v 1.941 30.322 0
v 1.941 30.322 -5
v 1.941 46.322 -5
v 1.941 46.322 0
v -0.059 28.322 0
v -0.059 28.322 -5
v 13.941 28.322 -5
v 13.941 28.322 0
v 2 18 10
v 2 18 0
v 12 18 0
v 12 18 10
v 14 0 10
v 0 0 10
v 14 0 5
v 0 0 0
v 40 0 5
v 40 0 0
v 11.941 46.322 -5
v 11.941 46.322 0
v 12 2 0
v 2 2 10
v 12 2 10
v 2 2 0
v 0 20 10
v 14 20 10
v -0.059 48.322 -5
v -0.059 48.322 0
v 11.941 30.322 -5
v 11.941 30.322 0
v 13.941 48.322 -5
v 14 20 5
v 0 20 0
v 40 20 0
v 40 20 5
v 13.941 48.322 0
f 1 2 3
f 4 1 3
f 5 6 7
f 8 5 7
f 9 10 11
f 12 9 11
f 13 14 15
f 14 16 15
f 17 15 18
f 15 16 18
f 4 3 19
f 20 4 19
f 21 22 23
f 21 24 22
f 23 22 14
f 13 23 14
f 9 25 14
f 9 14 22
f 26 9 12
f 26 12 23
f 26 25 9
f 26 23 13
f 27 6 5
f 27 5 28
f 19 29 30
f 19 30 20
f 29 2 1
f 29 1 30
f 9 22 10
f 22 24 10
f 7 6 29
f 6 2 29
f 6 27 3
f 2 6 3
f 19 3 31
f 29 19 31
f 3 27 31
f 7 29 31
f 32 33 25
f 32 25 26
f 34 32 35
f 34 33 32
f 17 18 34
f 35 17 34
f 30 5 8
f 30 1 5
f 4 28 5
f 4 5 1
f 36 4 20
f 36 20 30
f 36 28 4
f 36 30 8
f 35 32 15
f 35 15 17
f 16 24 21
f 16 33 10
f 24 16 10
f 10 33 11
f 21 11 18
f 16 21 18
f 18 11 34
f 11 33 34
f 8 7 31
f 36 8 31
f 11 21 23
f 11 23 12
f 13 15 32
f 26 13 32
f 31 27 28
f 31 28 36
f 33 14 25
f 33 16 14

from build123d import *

# Parameters (mm, degrees)
F2_W     = 14
F2_H     = 20
F2_W_2   = 10
F2_H_2   = 16
F3_DEPTH = 5
F0_W     = 40
F0_H     = 20
F0_W_2   = 10
F0_H_2   = 16
F4_DEPTH = 5
F5_W     = 14
F5_H     = 20
F5_W_2   = 10
F5_H_2   = 16
F6_DEPTH = 5


with BuildPart() as f3:
    # F2 (on offset) → F3 (new body)
    with BuildSketch(Plane.XY.offset(-5)):
        with Locations((6.941266, 38.321781)):
            Rectangle(F2_W, F2_H)
        with Locations((6.941266, 38.321781)):
            Rectangle(F2_W_2, F2_H_2, mode=Mode.SUBTRACT)
    extrude(amount=F3_DEPTH)


with BuildPart() as f4:
    # F0 (on Top) → F4 (new body)
    with BuildSketch(Plane.XY):
        with Locations((20, 10)):
            Rectangle(F0_W, F0_H)
        with Locations((7, 10)):
            Rectangle(F0_W_2, F0_H_2, mode=Mode.SUBTRACT)
    extrude(amount=F4_DEPTH)

    # F5 (on face) → F6 (join)
    with BuildSketch(Plane.XY.offset(5)):
        with Locations((7, 10)):
            Rectangle(F5_W, F5_H)
        with Locations((7, 10)):
            Rectangle(F5_W_2, F5_H_2, mode=Mode.SUBTRACT)
    extrude(amount=F6_DEPTH)


solid = Compound([f3.part, f4.part])
